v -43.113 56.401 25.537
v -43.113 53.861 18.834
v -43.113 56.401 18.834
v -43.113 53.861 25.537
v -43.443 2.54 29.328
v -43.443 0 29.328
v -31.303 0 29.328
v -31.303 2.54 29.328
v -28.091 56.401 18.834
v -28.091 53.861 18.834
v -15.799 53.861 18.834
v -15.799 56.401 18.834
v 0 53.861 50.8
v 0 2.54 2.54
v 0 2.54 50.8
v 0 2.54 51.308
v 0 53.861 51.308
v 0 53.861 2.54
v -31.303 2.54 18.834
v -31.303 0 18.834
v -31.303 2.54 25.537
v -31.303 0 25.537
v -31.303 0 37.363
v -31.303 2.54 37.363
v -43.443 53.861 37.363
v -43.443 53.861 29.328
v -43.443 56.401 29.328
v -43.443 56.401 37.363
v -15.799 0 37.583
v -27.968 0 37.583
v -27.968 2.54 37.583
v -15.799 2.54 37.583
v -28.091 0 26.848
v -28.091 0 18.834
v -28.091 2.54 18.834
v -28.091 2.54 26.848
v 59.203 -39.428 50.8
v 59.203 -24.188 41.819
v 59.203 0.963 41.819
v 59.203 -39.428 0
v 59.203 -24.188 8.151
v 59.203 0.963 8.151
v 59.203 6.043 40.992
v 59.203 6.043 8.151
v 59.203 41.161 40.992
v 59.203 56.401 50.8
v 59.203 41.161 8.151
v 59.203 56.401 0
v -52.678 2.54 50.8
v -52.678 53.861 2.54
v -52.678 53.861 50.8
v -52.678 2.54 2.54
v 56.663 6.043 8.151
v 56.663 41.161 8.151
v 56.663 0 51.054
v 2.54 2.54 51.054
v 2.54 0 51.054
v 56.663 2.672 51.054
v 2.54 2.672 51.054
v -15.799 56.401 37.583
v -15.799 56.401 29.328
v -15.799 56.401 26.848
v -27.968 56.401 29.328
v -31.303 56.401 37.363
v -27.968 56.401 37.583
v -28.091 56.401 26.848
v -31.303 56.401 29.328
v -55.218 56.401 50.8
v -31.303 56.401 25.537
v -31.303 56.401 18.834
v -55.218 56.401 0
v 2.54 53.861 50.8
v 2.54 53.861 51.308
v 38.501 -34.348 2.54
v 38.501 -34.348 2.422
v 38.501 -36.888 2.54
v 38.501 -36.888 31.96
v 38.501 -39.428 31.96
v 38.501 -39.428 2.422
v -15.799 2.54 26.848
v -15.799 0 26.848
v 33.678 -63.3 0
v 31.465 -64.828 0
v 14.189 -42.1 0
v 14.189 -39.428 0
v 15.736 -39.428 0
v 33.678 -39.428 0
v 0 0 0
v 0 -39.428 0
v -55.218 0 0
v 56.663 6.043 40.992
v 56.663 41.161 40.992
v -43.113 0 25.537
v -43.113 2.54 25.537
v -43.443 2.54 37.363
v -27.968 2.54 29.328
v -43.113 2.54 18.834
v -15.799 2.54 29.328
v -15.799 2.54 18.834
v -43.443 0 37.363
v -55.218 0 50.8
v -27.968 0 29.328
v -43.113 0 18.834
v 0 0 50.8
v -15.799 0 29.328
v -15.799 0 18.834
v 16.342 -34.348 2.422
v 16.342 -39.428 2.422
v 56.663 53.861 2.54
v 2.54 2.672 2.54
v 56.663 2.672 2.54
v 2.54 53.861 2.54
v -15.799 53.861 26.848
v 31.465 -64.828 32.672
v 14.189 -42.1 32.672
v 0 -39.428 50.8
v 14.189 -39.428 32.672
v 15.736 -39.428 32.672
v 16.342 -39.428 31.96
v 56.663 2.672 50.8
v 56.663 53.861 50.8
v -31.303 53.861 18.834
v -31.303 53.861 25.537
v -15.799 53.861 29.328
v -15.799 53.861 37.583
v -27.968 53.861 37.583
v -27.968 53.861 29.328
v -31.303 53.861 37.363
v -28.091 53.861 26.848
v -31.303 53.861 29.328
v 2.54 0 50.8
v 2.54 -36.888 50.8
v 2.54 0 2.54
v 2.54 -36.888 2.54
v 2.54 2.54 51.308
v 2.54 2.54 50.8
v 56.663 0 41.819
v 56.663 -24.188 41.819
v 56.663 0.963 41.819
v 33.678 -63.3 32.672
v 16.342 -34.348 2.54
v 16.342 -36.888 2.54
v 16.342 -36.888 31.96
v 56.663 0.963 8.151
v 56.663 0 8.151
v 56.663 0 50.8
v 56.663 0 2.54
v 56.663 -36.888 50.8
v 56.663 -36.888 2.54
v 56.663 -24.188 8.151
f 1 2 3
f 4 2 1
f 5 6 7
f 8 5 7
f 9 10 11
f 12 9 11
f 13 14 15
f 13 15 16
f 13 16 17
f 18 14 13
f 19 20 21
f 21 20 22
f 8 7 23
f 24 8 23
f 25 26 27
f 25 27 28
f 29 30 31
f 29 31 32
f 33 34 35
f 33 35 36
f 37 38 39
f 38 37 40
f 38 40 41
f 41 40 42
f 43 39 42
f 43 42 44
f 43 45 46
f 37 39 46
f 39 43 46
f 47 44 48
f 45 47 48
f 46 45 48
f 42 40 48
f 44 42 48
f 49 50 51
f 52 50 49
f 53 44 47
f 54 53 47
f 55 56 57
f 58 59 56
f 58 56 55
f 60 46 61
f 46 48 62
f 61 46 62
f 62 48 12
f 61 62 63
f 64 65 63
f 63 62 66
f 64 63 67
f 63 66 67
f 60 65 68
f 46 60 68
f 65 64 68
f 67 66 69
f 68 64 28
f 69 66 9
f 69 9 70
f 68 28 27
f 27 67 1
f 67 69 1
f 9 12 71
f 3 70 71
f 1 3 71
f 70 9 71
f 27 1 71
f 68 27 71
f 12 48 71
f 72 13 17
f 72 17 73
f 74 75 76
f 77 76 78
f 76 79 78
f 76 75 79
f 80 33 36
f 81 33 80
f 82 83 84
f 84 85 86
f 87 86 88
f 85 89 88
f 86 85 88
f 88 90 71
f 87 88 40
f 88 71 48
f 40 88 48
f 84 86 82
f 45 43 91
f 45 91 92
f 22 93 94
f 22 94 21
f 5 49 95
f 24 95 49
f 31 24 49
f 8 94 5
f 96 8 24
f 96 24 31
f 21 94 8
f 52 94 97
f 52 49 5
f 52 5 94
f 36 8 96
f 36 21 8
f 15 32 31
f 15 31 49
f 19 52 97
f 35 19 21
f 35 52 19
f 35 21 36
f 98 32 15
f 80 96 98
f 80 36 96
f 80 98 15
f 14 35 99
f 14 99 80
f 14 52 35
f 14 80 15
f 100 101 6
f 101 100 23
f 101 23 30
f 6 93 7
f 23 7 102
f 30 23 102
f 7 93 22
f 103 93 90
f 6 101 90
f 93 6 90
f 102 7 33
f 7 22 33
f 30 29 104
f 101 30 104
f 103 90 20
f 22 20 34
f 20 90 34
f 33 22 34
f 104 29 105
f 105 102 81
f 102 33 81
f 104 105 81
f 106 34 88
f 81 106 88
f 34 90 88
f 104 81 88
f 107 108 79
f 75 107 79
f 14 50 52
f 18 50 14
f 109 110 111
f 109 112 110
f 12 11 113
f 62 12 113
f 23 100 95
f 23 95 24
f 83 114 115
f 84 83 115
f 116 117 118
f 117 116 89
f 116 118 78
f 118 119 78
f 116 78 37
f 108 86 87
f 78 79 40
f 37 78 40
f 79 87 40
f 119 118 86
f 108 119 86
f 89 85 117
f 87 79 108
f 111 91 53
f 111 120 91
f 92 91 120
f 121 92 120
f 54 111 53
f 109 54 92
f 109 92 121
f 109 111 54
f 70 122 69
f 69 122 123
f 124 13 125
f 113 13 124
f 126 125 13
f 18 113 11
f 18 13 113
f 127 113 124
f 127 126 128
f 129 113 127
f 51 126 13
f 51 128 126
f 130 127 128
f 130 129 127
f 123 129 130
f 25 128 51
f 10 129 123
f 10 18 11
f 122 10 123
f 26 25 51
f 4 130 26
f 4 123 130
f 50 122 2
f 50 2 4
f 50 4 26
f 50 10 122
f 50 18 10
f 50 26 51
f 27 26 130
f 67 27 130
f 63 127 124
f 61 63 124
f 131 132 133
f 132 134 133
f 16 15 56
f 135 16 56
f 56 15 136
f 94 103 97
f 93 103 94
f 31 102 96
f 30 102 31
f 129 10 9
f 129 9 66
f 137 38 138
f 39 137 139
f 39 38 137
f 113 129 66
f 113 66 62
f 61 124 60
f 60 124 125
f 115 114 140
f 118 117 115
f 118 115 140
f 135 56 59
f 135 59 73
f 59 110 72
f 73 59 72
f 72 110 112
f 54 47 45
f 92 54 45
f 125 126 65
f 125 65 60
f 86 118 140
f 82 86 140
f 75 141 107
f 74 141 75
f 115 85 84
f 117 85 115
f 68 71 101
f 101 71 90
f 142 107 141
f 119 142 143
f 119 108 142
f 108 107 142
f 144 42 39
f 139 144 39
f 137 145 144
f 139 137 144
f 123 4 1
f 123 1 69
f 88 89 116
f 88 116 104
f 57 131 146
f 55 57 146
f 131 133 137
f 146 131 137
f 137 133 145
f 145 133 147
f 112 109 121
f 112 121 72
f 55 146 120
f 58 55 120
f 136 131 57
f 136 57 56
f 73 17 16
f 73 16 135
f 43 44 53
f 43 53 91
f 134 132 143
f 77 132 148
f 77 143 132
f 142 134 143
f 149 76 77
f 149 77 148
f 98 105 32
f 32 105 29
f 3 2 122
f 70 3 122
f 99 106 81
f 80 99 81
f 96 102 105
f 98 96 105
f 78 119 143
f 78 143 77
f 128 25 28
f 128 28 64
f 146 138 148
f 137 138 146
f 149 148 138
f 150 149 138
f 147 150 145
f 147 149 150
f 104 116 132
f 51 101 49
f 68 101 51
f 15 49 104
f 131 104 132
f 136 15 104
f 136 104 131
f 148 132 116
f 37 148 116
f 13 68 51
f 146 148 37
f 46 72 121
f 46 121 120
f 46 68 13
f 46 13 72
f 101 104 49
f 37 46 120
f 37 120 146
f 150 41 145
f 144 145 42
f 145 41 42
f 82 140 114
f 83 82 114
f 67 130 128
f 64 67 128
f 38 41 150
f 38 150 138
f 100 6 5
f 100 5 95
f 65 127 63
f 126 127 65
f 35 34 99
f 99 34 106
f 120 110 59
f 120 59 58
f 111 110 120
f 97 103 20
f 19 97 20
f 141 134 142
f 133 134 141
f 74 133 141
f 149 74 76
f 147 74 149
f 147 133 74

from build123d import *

# Parameters (mm, degrees)
F0_W      = 59.2034347355
F0_H      = 39.4279696047
F1_DEPTH  = 50.8
F2_T      = -2.54
F3_W      = 12.1403969824
F3_H      = 8.035345003
F3_W_2    = 12.169610709
F3_H_2    = 8.255334571
F3_W_3    = 12.2919734567
F3_H_3    = 8.0133527517
F3_W_4    = 11.809963733
F3_H_4    = 6.7030247301
F4_DEPTH  = 304.8
F5_W      = 25.1509935988
F5_H      = 33.6675519442
F5_W_2    = 35.1178152452
F5_H_2    = 32.8409761062
F6_DEPTH  = 25.4
F7_W      = 19.4892128929
F7_H      = 32.6723456383
F8_DEPTH  = 25.4
F10_DEPTH = 44.958
F12_DEPTH = 45.974
F14_DEPTH = 38.1
F16_W     = 22.1592243761
F16_H     = 29.5382153708
F17_DEPTH = 5.08
F18_W     = 2.54
F18_H     = 51.3208392394
F19_DEPTH = 48.768
F20_W     = 54.1234347355
F20_H     = 2.6716254652
F21_DEPTH = 48.514


with BuildPart() as f1:
    # F0 (on Top) → F1 (new body)
    with BuildSketch(Plane.XY):
        Polygon((59.2034347355, 56.4008392394), (-55.2182495594, 56.4008392394), (-55.2182495594, 0), (0, 0), (59.2034347355, 0), align=None)
        with Locations((29.6017173678, -19.7139848024)):
            Rectangle(F0_W, F0_H)
    extrude(amount=F1_DEPTH)

    # F2
    f2_openings = [f1.faces().sort_by_distance(p)[0] for p in [
        (9.326345, 15.473019, 50.8),
    ]]
    offset(amount=F2_T, openings=f2_openings, kind=Kind.INTERSECTION)

    # F3 (on Front) → F4 (cut)
    with BuildSketch(Plane.XZ):
        with Locations((-37.3727958649, 33.3452494815)):
            Rectangle(F3_W, F3_H)
        with Locations((-21.8836758286, 33.4552442655)):
            Rectangle(F3_W_2, F3_H_2)
        with Locations((-21.9448572025, 22.8410381824)):
            Rectangle(F3_W_3, F3_H_3)
        with Locations((-37.2075792402, 22.1858741716)):
            Rectangle(F3_W_4, F3_H_4)
    extrude(amount=-F4_DEPTH, mode=Mode.SUBTRACT)

    # F5 (on face) → F6 (cut)
    with BuildSketch(Plane.YZ.offset(59.2034347355)):
        with Locations((-11.6124728053, 24.9852682464)):
            Rectangle(F5_W, F5_H)
        with Locations((23.6019316167, 24.5719803274)):
            Rectangle(F5_W_2, F5_H_2)
    extrude(amount=-F6_DEPTH, mode=Mode.SUBTRACT)

    # F7 (on face) → F8 (join)
    with BuildSketch(Plane.XZ.offset(39.4279696047)):
        with Locations((23.9334818907, 16.3361728191)):
            Rectangle(F7_W, F7_H)
    extrude(amount=F8_DEPTH)

    # F9 (on face) → F10 (cut)
    with BuildSketch(Plane.XY.offset(32.6723456383)):
        Polygon((14.1888754442, -42.09953174), (14.1888754442, -64.8279696047), (31.4645133913, -64.8279696047), align=None)
    extrude(amount=-F10_DEPTH, mode=Mode.SUBTRACT)

    # F11 (on face) → F12 (cut)
    with BuildSketch(Plane.XY.offset(32.6723456383)):
        Polygon((15.7361254096, -39.4279696047), (33.6780883372, -63.2997527719), (33.6780883372, -39.4279696047), align=None)
    extrude(amount=-F12_DEPTH, mode=Mode.SUBTRACT)

    # F13 (on face) → F14 (cut)
    with BuildSketch(Plane.XY.offset(32.6723456383)):
        Polygon((33.6780883372, -63.2997527719), (31.4645133913, -64.8279696047), (33.6780883372, -64.8279696047), align=None)
    extrude(amount=-F14_DEPTH, mode=Mode.SUBTRACT)

    # F16 (on face) → F17 (cut)
    with BuildSketch(Plane.XZ.offset(39.4279696047)):
        with Locations((27.4216728285, 17.1910146018)):
            Rectangle(F16_W, F16_H)
    extrude(amount=-F17_DEPTH, mode=Mode.SUBTRACT)

    # F18 (on face) → F19 (join)
    with BuildSketch(Plane.XY.offset(2.54)):
        with Locations((1.27, 28.2004196197)):
            Rectangle(F18_W, F18_H)
    extrude(amount=F19_DEPTH)

    # F20 (on face) → F21 (join)
    with BuildSketch(Plane.XY.offset(2.54)):
        with Locations((29.6017173678, 1.3358127326)):
            Rectangle(F20_W, F20_H)
    extrude(amount=F21_DEPTH)


solid = f1.part
